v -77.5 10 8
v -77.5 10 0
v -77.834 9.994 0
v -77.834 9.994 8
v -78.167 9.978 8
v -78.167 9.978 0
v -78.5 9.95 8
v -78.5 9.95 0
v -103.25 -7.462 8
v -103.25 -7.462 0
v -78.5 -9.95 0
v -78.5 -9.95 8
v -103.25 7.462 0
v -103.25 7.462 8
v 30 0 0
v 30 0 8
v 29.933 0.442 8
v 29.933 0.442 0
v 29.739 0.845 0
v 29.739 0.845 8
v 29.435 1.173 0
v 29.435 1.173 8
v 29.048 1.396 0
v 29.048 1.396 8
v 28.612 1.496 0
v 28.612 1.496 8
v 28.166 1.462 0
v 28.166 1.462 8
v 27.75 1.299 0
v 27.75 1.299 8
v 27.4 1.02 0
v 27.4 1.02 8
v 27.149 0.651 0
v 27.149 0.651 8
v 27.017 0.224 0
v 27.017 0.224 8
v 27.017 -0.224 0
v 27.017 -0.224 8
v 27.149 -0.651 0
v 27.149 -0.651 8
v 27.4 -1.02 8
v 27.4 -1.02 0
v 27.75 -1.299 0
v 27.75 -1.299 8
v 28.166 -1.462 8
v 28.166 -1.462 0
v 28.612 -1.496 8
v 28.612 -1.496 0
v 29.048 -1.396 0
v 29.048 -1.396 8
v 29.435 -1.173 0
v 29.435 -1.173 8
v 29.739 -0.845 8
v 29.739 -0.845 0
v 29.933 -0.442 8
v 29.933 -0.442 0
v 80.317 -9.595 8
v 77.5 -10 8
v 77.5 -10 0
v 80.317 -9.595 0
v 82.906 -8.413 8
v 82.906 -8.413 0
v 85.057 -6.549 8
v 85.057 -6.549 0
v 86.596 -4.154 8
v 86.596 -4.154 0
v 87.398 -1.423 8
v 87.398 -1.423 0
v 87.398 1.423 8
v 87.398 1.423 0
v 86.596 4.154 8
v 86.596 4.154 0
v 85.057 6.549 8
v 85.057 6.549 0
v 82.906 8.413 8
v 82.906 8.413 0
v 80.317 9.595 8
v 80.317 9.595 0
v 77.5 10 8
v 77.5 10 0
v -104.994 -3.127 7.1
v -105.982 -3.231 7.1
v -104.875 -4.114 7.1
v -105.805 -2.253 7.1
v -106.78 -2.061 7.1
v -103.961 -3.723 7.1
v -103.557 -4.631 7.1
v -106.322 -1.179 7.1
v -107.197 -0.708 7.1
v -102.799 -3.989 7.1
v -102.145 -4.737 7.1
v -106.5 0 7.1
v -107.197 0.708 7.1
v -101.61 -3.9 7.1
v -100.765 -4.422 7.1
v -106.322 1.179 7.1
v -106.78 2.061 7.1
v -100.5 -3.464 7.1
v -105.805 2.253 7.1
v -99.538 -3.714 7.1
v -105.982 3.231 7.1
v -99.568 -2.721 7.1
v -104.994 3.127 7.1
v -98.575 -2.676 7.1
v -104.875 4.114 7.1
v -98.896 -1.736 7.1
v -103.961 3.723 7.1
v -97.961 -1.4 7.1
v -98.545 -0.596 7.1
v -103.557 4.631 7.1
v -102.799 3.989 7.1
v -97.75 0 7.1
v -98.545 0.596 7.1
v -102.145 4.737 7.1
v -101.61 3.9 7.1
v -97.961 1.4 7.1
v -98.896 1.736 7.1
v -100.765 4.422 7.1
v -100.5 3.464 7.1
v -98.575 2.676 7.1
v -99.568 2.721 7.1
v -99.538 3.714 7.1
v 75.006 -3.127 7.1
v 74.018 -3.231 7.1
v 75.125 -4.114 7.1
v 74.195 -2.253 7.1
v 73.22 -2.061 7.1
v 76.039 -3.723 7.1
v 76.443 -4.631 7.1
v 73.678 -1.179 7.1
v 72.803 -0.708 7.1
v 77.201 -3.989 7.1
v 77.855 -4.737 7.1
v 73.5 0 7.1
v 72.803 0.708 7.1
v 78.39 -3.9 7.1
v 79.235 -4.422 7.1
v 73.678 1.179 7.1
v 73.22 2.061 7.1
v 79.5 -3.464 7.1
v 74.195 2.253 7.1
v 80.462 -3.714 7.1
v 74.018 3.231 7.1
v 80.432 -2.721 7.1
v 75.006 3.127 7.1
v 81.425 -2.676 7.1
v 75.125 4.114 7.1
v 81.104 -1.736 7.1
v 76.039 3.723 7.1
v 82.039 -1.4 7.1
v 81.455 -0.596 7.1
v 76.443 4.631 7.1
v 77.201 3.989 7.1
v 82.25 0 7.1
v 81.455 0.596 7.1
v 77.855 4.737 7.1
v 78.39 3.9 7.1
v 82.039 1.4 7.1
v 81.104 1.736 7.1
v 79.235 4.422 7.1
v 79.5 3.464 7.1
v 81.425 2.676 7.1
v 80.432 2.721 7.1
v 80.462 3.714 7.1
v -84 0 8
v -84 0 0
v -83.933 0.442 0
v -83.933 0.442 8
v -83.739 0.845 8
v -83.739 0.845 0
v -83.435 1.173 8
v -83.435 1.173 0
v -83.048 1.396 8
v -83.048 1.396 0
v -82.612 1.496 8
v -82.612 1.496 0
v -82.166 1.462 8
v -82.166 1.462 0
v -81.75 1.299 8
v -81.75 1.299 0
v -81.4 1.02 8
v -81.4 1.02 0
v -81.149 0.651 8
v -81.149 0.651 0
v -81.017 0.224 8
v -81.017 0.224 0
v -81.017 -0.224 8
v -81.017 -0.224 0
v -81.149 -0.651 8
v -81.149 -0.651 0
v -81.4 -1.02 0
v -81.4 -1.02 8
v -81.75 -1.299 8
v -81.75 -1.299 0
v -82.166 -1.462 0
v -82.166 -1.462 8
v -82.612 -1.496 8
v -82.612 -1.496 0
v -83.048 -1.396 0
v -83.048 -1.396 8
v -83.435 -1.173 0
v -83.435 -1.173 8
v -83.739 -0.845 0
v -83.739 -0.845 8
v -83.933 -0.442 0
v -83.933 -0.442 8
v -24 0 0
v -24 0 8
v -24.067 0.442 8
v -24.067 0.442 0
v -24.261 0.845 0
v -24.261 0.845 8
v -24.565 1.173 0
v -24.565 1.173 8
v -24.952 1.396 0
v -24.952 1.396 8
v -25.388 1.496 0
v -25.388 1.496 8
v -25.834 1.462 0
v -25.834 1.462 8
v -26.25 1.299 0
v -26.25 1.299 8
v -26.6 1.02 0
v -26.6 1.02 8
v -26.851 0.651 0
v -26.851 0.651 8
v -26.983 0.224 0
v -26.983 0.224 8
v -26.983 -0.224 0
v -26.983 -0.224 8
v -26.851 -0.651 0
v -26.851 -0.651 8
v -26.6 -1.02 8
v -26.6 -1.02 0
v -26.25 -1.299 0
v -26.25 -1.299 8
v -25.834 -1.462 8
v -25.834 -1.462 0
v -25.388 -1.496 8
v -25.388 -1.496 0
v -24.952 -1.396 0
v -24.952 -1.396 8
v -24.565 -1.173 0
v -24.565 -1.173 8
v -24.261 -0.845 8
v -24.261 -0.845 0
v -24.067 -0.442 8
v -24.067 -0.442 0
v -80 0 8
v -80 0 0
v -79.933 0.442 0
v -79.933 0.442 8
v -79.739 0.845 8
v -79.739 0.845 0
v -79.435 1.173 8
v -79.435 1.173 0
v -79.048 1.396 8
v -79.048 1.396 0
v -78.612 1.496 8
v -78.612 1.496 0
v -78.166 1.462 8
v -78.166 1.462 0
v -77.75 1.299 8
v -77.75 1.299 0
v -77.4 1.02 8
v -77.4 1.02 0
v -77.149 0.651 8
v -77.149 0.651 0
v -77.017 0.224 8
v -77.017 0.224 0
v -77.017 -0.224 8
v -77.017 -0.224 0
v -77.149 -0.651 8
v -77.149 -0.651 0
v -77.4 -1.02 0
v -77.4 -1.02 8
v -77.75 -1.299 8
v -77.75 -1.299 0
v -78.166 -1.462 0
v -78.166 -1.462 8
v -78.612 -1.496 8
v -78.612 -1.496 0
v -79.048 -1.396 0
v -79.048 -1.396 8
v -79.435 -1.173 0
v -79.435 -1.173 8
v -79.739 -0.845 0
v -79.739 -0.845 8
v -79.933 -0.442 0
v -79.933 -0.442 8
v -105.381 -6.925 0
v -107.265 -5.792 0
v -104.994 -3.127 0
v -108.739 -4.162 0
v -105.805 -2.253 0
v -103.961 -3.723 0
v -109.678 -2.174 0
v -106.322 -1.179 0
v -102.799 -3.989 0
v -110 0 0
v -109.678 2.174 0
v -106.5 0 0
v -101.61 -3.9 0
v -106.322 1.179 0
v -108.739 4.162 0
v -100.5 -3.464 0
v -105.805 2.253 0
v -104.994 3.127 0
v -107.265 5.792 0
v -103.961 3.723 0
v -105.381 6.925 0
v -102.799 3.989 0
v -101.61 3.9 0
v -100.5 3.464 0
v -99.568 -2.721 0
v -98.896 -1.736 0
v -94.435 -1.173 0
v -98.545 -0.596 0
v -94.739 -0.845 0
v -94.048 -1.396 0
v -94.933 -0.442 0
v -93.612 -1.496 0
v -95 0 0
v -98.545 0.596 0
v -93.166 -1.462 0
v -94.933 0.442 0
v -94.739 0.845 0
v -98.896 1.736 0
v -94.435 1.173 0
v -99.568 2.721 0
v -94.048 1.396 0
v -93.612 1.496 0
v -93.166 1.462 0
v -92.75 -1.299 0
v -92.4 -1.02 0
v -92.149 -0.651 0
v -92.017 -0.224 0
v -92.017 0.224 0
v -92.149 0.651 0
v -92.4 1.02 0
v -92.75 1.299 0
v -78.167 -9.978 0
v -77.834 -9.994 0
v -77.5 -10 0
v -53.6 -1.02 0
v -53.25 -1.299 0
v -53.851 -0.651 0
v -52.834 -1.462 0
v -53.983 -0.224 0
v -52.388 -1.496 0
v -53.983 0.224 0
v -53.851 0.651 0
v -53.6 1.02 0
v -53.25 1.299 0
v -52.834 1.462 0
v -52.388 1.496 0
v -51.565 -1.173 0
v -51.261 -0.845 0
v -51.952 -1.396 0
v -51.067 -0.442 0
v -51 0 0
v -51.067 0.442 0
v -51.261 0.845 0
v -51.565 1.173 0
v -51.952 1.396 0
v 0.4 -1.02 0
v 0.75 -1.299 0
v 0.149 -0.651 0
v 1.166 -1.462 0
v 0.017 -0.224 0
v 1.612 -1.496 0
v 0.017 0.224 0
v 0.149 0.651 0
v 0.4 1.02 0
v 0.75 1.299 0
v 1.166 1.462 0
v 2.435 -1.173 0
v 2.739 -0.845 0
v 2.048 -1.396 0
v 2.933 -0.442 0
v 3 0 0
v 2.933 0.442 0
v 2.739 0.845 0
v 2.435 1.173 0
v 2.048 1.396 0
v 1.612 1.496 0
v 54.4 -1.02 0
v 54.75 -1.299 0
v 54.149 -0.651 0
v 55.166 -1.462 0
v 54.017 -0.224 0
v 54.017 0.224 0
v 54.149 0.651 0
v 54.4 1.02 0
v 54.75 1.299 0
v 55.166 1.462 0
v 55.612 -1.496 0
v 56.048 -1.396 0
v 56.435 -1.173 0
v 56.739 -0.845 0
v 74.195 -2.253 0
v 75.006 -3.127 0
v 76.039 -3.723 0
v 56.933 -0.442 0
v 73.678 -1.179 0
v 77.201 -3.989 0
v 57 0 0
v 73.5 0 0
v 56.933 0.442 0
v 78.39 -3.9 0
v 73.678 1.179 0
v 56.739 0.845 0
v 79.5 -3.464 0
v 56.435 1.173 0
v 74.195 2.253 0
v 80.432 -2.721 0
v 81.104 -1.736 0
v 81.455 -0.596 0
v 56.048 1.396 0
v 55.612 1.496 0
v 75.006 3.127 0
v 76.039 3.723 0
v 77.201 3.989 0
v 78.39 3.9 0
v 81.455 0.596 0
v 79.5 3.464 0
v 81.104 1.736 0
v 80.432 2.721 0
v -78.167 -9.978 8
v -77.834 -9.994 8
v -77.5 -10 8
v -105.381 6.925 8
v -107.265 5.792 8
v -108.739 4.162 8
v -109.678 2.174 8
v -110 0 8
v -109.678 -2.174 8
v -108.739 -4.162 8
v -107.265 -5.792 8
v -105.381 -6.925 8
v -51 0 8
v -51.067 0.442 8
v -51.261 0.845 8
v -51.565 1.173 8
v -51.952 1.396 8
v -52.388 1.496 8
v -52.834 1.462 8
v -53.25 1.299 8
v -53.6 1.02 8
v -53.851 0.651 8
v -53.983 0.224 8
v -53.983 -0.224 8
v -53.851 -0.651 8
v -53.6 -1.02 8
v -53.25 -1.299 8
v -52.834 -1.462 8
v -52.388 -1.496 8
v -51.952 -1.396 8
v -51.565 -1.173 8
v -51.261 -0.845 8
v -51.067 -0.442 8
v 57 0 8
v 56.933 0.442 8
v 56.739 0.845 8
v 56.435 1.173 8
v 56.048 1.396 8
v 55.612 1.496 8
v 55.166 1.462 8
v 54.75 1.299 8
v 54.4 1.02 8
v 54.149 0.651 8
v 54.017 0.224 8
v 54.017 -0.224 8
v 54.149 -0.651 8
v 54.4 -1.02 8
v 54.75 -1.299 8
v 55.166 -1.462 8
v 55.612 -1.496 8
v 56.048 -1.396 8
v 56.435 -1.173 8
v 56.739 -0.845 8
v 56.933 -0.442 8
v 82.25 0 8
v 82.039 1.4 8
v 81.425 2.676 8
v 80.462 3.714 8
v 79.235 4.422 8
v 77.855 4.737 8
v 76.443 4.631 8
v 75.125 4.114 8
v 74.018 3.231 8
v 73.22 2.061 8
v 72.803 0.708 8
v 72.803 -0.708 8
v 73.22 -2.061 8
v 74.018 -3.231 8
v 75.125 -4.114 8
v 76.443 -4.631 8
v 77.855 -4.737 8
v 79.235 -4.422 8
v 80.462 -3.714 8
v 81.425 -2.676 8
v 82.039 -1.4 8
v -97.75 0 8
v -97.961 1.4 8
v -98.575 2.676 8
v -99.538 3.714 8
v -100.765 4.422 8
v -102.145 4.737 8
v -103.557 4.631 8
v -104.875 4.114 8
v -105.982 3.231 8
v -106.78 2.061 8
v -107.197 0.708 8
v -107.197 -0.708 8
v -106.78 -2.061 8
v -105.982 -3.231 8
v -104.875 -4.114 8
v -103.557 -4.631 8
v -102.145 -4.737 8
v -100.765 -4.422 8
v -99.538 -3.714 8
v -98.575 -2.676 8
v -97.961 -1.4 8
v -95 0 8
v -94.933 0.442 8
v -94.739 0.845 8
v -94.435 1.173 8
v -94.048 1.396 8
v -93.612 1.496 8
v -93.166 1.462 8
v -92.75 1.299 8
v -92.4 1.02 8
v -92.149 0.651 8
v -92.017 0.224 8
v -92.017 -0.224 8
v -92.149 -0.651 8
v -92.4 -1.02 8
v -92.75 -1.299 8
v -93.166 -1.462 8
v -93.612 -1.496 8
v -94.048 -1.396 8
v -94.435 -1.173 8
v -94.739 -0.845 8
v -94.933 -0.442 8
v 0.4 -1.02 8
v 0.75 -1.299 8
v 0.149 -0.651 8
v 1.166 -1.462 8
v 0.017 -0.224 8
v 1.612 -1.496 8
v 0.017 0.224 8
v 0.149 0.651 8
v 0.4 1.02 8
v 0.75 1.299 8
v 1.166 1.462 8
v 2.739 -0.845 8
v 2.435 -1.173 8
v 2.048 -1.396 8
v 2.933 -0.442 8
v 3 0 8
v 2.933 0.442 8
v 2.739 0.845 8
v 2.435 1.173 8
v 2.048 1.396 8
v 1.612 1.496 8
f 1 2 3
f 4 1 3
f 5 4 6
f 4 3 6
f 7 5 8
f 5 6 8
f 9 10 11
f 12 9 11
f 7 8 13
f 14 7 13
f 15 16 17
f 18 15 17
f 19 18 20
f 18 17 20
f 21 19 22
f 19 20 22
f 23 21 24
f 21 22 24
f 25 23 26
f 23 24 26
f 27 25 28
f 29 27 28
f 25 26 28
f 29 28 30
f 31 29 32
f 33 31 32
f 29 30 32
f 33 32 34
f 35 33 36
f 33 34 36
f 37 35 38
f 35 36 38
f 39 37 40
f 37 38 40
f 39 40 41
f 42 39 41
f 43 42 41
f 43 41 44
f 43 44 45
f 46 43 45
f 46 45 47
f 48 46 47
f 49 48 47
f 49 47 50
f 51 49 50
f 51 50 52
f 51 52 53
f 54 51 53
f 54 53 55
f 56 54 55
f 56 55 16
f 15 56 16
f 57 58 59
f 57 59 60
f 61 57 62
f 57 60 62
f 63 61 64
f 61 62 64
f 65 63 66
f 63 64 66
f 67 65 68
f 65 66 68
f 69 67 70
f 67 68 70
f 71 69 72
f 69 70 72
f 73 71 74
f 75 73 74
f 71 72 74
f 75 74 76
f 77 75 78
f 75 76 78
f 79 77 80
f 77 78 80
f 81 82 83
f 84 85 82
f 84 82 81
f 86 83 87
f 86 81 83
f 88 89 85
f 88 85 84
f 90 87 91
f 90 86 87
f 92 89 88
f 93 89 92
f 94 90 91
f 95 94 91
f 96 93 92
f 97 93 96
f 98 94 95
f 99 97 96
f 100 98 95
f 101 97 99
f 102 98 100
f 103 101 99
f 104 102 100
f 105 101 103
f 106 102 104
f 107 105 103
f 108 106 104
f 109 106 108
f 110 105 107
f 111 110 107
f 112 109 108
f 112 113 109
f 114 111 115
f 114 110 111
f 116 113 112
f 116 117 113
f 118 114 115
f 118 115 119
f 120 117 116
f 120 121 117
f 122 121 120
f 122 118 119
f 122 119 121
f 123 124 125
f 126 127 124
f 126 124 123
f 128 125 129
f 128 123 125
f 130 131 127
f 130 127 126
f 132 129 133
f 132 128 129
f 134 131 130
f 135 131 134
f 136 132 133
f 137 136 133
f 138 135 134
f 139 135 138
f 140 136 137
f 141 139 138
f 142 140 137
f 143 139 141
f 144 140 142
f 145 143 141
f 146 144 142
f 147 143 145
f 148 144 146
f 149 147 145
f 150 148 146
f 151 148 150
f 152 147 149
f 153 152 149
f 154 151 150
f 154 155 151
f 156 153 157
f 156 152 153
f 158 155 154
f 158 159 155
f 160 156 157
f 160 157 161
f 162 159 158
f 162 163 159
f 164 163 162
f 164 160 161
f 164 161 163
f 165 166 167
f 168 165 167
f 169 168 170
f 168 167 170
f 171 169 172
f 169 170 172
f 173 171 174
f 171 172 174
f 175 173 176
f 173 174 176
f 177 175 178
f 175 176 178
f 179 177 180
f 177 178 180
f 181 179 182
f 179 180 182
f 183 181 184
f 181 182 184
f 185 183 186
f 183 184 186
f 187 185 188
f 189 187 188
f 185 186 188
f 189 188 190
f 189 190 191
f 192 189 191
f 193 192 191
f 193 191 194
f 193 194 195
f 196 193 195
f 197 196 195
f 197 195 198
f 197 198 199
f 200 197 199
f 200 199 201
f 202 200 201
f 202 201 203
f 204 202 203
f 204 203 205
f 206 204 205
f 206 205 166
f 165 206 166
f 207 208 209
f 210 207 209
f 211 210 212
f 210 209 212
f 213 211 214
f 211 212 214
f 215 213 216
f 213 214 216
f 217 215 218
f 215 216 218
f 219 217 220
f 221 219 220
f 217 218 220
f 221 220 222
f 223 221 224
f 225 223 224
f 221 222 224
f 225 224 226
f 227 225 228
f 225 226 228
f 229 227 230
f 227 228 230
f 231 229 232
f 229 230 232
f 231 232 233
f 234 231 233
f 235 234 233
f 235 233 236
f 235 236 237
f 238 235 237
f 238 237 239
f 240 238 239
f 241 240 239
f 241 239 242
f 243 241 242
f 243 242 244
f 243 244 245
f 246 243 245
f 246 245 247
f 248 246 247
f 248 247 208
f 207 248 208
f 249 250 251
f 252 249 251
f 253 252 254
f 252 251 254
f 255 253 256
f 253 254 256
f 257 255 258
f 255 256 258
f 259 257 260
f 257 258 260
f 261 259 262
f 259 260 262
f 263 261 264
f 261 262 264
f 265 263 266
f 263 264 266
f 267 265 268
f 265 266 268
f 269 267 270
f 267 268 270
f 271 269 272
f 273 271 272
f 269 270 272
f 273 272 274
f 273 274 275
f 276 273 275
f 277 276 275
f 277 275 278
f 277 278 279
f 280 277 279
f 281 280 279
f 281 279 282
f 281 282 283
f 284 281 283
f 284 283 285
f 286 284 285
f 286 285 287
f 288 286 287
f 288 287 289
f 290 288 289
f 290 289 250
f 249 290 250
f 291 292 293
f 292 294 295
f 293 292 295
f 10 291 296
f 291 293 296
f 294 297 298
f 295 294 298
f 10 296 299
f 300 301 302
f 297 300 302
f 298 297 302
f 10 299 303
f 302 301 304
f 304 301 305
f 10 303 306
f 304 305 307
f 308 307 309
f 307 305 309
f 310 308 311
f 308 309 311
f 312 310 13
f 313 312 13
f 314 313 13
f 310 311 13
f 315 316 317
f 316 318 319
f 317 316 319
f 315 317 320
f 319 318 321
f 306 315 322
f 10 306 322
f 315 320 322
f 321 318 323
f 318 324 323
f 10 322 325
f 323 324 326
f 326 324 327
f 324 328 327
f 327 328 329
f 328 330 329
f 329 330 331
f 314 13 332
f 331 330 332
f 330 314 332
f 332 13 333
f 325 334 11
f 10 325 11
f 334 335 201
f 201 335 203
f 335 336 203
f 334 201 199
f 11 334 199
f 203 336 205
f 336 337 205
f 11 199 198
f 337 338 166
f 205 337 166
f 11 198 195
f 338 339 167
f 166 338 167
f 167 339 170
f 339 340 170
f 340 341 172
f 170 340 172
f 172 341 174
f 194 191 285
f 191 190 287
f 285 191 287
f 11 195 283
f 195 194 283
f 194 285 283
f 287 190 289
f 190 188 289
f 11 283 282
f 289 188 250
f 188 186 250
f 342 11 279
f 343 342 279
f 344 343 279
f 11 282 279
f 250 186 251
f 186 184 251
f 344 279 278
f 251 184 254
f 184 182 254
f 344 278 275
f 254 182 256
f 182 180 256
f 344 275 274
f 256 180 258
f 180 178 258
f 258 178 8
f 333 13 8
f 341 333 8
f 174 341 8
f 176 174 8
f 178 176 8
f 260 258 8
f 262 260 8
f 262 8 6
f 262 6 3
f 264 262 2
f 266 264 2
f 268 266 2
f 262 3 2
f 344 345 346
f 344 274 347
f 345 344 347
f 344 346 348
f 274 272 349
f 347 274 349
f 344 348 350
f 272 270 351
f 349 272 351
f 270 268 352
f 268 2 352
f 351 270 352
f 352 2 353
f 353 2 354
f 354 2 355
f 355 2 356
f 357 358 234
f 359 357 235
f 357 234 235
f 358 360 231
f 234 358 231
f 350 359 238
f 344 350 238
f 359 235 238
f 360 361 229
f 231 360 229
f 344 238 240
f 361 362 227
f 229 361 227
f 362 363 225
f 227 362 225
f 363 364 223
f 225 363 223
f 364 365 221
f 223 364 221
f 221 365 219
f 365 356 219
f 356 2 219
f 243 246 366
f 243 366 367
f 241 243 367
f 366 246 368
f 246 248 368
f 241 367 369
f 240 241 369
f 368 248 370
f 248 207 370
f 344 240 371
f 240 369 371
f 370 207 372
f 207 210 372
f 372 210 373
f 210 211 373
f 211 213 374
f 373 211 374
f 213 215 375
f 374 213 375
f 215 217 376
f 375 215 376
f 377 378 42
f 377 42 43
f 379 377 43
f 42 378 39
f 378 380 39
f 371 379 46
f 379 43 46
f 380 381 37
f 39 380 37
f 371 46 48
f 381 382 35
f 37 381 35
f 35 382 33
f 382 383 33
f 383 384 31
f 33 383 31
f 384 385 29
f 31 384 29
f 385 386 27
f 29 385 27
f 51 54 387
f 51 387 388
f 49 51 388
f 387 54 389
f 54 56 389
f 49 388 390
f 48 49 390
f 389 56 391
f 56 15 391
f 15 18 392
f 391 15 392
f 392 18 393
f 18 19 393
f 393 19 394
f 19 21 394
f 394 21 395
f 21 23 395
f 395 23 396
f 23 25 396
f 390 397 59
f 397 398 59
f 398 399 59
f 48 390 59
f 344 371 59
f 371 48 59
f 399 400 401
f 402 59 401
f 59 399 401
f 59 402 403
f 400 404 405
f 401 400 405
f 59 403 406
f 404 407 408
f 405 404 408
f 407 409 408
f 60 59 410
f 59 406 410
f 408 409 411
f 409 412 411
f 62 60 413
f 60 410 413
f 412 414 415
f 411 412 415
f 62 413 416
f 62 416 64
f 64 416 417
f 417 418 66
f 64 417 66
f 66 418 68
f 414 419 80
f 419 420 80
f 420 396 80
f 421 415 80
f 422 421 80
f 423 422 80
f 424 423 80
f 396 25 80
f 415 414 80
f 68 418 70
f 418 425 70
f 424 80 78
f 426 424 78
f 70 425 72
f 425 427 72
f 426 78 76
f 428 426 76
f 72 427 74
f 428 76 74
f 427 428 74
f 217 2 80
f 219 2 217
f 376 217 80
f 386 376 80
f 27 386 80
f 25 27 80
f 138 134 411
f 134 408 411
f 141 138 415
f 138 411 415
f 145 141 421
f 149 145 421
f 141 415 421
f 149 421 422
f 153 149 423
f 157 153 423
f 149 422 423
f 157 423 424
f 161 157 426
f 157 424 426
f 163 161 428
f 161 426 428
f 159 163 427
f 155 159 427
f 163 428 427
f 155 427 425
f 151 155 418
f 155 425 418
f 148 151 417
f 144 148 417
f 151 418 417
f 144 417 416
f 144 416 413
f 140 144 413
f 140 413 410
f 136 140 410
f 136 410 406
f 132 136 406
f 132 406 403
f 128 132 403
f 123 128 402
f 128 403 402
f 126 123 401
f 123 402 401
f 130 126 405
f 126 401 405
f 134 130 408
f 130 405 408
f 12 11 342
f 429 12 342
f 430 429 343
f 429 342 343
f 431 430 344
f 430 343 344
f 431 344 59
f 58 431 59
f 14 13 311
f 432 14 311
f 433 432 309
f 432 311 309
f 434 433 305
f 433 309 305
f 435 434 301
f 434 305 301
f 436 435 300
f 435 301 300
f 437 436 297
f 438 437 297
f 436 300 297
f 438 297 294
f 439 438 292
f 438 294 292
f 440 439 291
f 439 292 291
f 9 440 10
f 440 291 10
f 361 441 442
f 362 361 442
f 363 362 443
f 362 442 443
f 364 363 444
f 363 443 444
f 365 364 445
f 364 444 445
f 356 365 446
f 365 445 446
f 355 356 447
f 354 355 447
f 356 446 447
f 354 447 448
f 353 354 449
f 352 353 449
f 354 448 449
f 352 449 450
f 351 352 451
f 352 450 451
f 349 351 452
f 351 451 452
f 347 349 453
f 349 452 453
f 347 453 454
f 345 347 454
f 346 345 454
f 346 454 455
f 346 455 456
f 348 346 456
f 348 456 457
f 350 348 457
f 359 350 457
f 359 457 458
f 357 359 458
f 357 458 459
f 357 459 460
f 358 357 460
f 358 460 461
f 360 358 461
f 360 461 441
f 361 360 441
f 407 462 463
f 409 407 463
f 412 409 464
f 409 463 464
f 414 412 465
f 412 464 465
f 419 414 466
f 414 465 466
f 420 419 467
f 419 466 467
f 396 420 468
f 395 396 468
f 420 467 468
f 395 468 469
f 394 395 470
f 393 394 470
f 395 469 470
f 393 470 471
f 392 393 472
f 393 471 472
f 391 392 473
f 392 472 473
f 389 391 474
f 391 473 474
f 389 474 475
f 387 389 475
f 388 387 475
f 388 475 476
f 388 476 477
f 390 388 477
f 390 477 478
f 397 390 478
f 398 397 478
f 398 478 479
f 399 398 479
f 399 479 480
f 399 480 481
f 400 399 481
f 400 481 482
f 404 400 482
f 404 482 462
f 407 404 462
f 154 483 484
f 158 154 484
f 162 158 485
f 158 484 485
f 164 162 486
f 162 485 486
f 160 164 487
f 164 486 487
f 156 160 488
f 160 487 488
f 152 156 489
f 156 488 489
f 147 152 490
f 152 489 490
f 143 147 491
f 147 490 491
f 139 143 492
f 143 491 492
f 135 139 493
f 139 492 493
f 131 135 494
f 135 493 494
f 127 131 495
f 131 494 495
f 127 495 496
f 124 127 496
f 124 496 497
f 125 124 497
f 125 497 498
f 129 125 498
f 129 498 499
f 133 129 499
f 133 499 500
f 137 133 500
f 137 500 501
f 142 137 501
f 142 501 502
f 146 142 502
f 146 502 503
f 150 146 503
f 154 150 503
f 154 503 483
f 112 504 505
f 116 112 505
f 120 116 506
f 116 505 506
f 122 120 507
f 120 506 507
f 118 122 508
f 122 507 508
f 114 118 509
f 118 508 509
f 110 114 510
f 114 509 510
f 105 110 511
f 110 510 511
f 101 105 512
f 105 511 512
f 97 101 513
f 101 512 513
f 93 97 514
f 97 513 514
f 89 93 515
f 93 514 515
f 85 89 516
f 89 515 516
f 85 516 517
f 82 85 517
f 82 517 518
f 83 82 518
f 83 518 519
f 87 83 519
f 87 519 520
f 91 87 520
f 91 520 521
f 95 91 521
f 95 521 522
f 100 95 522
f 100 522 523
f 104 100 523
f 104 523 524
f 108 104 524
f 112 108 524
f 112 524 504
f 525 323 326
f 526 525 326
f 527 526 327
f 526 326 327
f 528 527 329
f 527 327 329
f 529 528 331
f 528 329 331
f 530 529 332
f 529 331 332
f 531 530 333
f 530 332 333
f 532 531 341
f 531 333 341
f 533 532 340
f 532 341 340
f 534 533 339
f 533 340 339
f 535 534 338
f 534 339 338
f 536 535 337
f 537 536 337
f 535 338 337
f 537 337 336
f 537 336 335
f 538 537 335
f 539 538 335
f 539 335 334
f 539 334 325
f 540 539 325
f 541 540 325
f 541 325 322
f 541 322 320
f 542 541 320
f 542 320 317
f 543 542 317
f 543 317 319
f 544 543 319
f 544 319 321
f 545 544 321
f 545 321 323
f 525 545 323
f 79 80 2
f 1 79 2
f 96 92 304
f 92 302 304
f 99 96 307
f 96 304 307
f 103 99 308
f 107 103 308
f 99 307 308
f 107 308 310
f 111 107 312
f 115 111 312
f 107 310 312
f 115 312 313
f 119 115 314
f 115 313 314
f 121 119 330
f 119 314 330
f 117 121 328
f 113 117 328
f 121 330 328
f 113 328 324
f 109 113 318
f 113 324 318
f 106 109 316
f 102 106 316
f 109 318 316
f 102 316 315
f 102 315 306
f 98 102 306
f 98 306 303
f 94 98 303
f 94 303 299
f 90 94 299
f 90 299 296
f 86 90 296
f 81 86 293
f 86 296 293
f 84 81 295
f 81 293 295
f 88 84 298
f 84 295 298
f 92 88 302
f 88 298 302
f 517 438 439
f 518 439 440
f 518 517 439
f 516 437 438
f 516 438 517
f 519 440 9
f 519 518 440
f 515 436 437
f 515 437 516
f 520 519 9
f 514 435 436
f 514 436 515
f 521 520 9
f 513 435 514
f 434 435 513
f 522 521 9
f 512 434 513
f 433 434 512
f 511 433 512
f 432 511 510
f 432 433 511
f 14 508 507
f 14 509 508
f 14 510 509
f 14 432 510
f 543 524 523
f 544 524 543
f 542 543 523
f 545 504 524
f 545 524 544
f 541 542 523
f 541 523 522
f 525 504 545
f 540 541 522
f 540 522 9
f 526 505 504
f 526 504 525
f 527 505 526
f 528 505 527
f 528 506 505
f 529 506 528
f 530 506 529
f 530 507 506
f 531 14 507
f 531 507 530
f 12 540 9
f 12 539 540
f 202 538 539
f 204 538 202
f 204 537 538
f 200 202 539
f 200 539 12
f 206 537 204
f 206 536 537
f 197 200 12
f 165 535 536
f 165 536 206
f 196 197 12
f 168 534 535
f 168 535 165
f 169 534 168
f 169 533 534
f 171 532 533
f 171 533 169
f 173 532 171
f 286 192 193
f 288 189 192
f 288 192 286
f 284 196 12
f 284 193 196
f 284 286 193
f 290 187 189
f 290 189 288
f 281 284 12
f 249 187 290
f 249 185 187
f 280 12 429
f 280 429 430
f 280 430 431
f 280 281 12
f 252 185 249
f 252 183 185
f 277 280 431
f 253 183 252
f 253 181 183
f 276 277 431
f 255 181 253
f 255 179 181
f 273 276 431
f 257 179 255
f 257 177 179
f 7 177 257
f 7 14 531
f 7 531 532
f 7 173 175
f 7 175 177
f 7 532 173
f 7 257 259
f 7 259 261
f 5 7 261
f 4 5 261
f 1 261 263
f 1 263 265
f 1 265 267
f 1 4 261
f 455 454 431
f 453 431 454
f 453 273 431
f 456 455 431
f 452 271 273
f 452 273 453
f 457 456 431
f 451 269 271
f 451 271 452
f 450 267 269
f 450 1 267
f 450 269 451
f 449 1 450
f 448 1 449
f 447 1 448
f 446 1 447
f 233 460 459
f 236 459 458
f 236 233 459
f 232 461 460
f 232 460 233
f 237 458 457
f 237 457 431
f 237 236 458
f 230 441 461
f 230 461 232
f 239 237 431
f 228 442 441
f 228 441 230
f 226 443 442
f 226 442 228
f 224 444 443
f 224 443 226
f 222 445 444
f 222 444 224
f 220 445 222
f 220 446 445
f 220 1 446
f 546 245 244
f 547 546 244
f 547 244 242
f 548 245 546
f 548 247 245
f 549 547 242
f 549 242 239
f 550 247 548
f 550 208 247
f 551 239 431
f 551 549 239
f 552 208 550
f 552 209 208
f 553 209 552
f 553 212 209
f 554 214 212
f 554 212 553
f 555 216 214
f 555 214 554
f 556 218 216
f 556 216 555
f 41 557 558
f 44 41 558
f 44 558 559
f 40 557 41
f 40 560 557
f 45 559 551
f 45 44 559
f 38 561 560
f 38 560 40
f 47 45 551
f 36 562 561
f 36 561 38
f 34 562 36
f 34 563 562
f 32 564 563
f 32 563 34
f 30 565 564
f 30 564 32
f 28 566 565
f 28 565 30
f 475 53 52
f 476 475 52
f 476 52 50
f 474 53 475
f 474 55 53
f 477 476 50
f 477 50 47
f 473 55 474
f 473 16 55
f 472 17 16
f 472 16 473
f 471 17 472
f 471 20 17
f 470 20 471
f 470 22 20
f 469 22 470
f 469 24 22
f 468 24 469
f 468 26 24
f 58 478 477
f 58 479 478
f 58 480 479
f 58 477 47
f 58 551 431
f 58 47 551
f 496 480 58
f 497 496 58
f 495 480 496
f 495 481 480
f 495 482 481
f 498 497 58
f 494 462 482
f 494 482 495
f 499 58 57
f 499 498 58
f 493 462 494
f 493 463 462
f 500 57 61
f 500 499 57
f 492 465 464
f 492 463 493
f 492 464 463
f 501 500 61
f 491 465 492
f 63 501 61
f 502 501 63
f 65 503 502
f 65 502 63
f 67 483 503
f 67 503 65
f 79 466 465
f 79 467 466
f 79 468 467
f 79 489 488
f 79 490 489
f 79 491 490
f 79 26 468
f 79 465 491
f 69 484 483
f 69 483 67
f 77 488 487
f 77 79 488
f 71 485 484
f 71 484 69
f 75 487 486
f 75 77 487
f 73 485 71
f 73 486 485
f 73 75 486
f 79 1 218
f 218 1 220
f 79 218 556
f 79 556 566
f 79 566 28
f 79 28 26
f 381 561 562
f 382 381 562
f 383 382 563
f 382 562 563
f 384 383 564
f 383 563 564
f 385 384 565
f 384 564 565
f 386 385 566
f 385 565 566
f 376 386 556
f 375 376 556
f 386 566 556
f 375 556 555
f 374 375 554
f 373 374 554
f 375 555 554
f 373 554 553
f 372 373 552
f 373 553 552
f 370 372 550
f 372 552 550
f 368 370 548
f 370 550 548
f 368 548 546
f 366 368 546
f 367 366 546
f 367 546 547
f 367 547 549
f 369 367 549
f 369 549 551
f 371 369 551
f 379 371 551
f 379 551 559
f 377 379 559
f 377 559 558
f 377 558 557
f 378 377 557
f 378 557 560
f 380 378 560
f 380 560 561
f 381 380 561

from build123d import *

# Parameters (mm, degrees)
EXTRUDE_1_DEPTH              = 8
HOLE_WIZARD_M3_2_D           = 3
HOLE_WIZARD_M5_1_D           = 8
HOLE_WIZARD_M5_1_CBORE_D     = 9.5
HOLE_WIZARD_M5_1_CBORE_DEPTH = 0.9
SKETCH_11_R                  = 1.5
CUT_EXTRUDE_1_DEPTH          = 1
CUT_EXTRUDE_1_DEPTH_BACK     = 9


with BuildPart() as part:
    # 草图1 → 凸台-拉伸1 (new body)
    with BuildSketch(Plane.XY):
        with BuildLine():
            Line((77.5, 10), (-77.5, 10))
            ThreePointArc((-77.5, 10), (-70.428932188, 7.071067812), (-67.5, 0))
            ThreePointArc((-67.5, 0), (-70.428932188, -7.071067812), (-77.5, -10))
            Line((-77.5, -10), (77.5, -10))
            ThreePointArc((77.5, -10), (87.5, 0), (77.5, 10))
        make_face()
        with BuildLine():
            ThreePointArc((-67.5, 0), (-70.428932188, 7.071067812), (-77.5, 10))
            ThreePointArc((-77.5, 10), (-78.000627751, 9.987460731), (-78.5, 9.949874371))
            ThreePointArc((-78.5, 9.949874371), (-87.5, 0), (-78.5, -9.949874371))
            ThreePointArc((-78.5, -9.949874371), (-78.000627751, -9.987460731), (-77.5, -10))
            ThreePointArc((-77.5, -10), (-70.428932188, -7.071067812), (-67.5, 0))
        make_face()
        with BuildLine():
            ThreePointArc((-78.5, -9.949874371), (-87.5, 0), (-78.5, 9.949874371))
            Line((-78.5, 9.949874371), (-103.25, 7.462405778))
            ThreePointArc((-103.25, 7.462405778), (-110, 0), (-103.25, -7.462405778))
            Line((-103.25, -7.462405778), (-78.5, -9.949874371))
        make_face()
    extrude(amount=EXTRUDE_1_DEPTH)

    # M3 螺纹孔2 (through all)
    with Locations(Plane.XY.offset(8)):
        with Locations((-78.5, 0), (-93.5, 0), (-82.5, 0)):
            Hole(HOLE_WIZARD_M3_2_D / 2)

    # M5 六角头螺栓的柱形沉头孔1 (through all)
    with Locations(Plane.XY.offset(8)):
        with Locations((-102.5, 0), (77.5, 0)):
            CounterBoreHole(HOLE_WIZARD_M5_1_D / 2, HOLE_WIZARD_M5_1_CBORE_D / 2, HOLE_WIZARD_M5_1_CBORE_DEPTH)

    # 草图11 → 切除-拉伸1 (cut, two sides)
    with BuildSketch(Plane.XY.offset(8)) as cut_extrude_1_sk:
        with Locations((-52.5, 0)):
            Circle(SKETCH_11_R)
        with Locations((-25.5, 0)):
            Circle(SKETCH_11_R)
        with Locations((1.5, 0)):
            Circle(SKETCH_11_R)
        with Locations((28.5, 0)):
            Circle(SKETCH_11_R)
        with Locations((55.5, 0)):
            Circle(SKETCH_11_R)
    extrude(amount=CUT_EXTRUDE_1_DEPTH, mode=Mode.SUBTRACT)
    extrude(cut_extrude_1_sk.sketch, amount=-CUT_EXTRUDE_1_DEPTH_BACK, mode=Mode.SUBTRACT)


solid = part.part
